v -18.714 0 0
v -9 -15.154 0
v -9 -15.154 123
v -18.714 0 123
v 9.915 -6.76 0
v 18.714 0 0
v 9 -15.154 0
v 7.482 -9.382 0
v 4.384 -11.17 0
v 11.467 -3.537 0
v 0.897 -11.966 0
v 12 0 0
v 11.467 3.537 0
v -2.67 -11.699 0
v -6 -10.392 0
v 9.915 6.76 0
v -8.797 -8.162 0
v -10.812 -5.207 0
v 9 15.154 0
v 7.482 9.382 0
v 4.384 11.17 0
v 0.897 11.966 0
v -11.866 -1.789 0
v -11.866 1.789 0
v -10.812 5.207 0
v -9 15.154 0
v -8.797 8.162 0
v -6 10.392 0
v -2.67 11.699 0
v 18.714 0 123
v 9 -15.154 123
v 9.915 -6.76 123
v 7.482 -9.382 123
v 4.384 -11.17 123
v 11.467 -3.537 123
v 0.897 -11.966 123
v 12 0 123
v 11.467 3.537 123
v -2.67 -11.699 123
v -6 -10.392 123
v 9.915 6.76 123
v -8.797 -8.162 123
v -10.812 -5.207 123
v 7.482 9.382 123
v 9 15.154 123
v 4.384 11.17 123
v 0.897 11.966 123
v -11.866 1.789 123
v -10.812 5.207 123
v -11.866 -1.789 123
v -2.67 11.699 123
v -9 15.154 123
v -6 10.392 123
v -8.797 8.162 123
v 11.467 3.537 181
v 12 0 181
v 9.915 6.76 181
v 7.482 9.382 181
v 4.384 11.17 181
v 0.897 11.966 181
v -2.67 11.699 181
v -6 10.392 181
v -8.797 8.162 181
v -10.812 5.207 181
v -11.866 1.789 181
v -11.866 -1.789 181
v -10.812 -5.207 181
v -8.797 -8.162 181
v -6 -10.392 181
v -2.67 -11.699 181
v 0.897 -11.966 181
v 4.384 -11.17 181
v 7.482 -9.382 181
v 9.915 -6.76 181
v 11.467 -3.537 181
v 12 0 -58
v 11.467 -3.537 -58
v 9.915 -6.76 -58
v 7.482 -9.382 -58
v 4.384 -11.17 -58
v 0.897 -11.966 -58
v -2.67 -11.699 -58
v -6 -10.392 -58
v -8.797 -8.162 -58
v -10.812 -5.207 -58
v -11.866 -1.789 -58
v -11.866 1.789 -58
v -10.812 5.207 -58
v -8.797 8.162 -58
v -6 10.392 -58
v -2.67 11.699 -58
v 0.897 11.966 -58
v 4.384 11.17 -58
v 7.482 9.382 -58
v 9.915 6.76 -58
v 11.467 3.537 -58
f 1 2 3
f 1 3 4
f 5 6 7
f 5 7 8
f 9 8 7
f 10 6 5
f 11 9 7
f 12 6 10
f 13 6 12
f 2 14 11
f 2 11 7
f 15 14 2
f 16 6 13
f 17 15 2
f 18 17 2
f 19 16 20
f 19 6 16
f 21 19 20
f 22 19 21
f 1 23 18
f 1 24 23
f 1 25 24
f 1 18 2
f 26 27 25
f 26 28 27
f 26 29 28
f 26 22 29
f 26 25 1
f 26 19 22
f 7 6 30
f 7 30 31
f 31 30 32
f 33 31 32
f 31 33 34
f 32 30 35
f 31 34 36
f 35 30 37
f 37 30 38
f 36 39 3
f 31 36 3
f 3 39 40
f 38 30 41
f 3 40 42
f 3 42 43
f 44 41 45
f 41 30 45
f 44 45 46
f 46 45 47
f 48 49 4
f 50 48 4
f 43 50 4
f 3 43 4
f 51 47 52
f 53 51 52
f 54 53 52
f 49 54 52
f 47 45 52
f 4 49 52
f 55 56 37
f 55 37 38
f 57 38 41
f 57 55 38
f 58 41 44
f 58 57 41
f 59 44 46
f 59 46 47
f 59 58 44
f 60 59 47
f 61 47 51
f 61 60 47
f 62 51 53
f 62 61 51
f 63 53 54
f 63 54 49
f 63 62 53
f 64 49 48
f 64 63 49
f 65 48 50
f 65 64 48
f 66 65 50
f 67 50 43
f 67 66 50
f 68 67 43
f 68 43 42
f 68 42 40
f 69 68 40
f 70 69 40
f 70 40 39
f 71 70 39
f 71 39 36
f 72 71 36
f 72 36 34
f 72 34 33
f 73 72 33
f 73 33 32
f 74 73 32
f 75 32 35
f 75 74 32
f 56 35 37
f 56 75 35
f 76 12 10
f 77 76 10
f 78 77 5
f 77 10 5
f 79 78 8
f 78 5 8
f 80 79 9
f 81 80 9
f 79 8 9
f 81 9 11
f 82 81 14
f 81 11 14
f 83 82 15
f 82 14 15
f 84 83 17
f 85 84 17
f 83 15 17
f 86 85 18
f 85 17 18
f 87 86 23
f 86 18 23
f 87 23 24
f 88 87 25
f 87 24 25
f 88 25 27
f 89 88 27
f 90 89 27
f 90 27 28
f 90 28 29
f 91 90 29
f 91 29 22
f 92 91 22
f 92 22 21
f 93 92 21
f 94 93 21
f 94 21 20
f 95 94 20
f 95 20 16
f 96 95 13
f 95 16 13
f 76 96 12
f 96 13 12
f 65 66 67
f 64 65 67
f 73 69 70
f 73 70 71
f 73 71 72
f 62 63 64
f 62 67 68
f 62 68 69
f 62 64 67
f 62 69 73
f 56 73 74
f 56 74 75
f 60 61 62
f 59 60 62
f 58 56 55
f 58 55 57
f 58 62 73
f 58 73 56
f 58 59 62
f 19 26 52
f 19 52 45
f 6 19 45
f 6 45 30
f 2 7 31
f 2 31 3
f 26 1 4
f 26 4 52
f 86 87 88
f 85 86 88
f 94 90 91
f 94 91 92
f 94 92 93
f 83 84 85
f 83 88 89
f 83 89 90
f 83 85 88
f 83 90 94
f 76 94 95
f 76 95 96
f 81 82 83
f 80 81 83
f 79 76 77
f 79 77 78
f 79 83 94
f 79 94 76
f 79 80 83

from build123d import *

# Parameters (mm, degrees)
BOSS_EXTRUDE1_DEPTH = 123
SKETCH2_R           = 12
BOSS_EXTRUDE2_DEPTH = 58
BOSS_EXTRUDE3_START = 58
SKETCH3_R           = 12
BOSS_EXTRUDE3_DEPTH = 58


with BuildPart() as part:
    # Sketch1 → Boss-Extrude1 (new body)
    with BuildSketch(Plane.XY):
        Polygon((-9, 15.15359655), (9, 15.15359655), (18.714345659, 0), (9, -15.15359655), (-9, -15.15359655), (-18.714345659, 0), align=None)
    extrude(amount=BOSS_EXTRUDE1_DEPTH)

    # Sketch2 → Boss-Extrude2 (add)
    with BuildSketch(Plane(origin=(0, 0, 0), x_dir=(-1, 0, 0), z_dir=(0, 0, -1))):
        with Locations(Location((0, 0, 0), (0, 0, 180))):
            Circle(SKETCH2_R)
    extrude(amount=BOSS_EXTRUDE2_DEPTH)

    # Sketch3 → Boss-Extrude3 (add)
    with BuildSketch(Plane.XY.offset(123).offset(BOSS_EXTRUDE3_START)):
        Circle(SKETCH3_R)
    extrude(amount=-BOSS_EXTRUDE3_DEPTH)


solid = part.part
